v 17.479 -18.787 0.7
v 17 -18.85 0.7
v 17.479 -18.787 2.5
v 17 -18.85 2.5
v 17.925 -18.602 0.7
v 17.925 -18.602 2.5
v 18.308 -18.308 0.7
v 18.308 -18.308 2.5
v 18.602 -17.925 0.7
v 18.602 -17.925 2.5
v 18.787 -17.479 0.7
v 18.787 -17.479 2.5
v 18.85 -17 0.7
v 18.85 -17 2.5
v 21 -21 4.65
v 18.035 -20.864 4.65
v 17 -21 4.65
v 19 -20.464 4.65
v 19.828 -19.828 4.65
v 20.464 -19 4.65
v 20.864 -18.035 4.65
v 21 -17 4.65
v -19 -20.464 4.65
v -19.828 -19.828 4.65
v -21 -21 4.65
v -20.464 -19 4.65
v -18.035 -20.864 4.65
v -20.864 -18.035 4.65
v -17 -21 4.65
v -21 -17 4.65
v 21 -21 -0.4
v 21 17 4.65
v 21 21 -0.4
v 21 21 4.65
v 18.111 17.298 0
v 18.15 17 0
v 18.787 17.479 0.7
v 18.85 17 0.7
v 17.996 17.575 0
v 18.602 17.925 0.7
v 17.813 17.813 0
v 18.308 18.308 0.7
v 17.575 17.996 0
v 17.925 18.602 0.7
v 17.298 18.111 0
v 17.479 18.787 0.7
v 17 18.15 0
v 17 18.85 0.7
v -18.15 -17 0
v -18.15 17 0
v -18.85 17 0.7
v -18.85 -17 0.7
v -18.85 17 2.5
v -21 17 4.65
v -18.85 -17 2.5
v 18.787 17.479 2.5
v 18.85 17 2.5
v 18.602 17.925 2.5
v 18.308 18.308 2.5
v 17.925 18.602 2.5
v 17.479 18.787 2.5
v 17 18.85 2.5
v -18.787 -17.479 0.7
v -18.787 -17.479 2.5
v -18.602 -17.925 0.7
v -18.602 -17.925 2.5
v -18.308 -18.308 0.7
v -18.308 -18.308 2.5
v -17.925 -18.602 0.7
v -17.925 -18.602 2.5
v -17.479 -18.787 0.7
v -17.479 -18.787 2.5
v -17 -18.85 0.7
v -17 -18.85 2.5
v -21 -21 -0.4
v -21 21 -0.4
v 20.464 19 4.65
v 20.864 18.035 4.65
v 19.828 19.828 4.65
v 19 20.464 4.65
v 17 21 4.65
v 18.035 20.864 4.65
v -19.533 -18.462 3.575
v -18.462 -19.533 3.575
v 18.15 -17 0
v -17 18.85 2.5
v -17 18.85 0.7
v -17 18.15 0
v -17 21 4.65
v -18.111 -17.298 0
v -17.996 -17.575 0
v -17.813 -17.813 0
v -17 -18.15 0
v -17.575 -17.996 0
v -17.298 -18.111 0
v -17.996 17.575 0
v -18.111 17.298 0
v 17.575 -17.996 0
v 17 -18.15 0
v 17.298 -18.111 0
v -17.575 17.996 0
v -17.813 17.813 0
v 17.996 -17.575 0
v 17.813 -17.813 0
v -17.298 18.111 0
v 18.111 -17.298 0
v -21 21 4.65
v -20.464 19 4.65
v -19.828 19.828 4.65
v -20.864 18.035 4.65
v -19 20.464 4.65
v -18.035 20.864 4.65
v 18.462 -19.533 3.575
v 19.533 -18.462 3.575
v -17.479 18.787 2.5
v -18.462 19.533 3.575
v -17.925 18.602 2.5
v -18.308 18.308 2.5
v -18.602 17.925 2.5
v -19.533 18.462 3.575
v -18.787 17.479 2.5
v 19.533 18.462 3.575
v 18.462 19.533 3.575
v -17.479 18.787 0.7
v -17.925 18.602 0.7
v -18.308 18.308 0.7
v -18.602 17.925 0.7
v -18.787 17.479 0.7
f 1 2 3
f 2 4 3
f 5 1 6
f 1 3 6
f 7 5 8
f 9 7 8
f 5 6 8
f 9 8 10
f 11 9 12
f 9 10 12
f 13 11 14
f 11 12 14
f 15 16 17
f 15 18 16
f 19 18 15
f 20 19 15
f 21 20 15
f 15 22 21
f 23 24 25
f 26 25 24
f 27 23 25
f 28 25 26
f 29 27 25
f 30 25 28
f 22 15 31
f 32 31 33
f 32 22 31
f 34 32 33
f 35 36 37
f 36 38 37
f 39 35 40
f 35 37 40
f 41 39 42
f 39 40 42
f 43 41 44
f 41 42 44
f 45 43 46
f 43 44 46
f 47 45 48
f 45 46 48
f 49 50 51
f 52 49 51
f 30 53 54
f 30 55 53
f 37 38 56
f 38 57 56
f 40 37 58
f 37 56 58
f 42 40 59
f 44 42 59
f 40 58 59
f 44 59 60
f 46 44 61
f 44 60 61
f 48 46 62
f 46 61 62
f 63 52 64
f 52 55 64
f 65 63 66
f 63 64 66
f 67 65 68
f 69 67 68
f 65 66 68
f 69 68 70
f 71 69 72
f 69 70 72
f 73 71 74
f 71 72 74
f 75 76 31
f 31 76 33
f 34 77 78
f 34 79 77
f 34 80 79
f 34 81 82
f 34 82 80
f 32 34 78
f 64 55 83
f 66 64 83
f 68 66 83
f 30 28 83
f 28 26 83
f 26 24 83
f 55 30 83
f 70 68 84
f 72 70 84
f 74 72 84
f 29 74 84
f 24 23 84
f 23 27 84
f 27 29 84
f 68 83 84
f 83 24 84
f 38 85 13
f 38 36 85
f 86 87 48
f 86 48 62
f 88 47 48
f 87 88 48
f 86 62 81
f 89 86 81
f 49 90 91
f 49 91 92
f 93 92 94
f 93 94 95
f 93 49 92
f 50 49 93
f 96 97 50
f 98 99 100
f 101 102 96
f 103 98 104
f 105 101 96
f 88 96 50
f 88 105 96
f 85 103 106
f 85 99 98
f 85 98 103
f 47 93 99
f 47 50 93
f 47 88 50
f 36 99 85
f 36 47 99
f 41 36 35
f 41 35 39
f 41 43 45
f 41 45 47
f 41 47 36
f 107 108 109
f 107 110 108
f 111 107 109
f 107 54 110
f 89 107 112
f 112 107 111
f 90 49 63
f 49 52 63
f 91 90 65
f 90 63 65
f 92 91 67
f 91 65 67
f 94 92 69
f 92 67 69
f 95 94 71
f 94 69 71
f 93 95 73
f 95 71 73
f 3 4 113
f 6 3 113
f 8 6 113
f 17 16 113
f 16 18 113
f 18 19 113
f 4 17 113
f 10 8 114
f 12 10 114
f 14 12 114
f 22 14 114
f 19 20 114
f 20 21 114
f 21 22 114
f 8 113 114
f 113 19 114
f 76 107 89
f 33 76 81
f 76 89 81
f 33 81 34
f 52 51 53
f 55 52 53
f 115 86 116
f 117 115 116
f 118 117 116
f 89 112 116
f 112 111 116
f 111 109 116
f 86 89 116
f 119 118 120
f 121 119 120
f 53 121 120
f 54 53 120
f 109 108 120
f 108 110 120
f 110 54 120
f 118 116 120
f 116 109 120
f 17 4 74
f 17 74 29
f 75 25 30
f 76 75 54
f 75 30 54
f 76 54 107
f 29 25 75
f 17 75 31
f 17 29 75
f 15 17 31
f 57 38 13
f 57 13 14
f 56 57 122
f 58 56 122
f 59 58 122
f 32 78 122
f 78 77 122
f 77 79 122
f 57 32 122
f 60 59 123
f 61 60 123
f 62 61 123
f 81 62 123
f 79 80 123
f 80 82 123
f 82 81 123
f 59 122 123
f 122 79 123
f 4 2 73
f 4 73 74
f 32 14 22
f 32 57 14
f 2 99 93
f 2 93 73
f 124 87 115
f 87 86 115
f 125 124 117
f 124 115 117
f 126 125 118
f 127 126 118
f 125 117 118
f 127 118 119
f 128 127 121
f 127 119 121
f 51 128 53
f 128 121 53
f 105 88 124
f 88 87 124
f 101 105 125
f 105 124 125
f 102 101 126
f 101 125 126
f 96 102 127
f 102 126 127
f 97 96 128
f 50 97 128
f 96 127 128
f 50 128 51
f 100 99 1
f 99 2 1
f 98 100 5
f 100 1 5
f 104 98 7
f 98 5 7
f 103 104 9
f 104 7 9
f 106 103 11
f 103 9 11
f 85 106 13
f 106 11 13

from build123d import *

# Parameters (mm, degrees)
SKETCH_W       = 42
SKETCH_H       = 42
PAD_DEPTH      = 4.65
PAD_DEPTH_BACK = 0.4
POCKET_DEPTH   = 4.651


with BuildPart() as part:
    # Sketch → Pad (new body, two sides)
    with BuildSketch(Plane.XY) as pad_sk:
        Rectangle(SKETCH_W, SKETCH_H)
    extrude(amount=PAD_DEPTH)
    extrude(pad_sk.sketch, amount=-PAD_DEPTH_BACK)

    # SubtractivePipe: sweep along a path in Sketch001
    with BuildLine(Plane.XY) as subtractivepipe_path:
        Line((-17, -21), (17, -21))
        ThreePointArc((17, -21), (19.828427, -19.828427), (21, -17))
        Line((21, -17), (21, 17))
        ThreePointArc((21, 17), (19.828427, 19.828427), (17, 21))
        Line((17, 21), (-17, 21))
        ThreePointArc((-17, 21), (-19.828427, 19.828427), (-21, 17))
        Line((-21, 17), (-21, -17))
        ThreePointArc((-21, -17), (-19.828427, -19.828427), (-17, -21))
    # Sketch002 → SubtractivePipe (sweep, cut)
    with BuildSketch(Plane.XZ):
        Polygon((21, 4.65), (18.85, 2.5), (18.85, 0.7), (18.15, 0), (18.15, 4.65), align=None)
    sweep(path=subtractivepipe_path.line, mode=Mode.SUBTRACT)

    # Sketch003 → Pocket (cut, through all)
    with BuildSketch(Plane.XY):
        with BuildLine():
            Line((18.15, -17), (18.15, 17))
            ThreePointArc((18.15, 17), (17.813173, 17.813173), (17, 18.15))
            Line((17, 18.15), (-17, 18.15))
            ThreePointArc((-17, 18.15), (-17.813173, 17.813173), (-18.15, 17))
            Line((-18.15, 17), (-18.15, -17))
            ThreePointArc((-18.15, -17), (-17.813173, -17.813173), (-17, -18.15))
            Line((-17, -18.15), (17, -18.15))
            ThreePointArc((17, -18.15), (17.813173, -17.813173), (18.15, -17))
        make_face()
    extrude(amount=POCKET_DEPTH, mode=Mode.SUBTRACT)


solid = part.part
